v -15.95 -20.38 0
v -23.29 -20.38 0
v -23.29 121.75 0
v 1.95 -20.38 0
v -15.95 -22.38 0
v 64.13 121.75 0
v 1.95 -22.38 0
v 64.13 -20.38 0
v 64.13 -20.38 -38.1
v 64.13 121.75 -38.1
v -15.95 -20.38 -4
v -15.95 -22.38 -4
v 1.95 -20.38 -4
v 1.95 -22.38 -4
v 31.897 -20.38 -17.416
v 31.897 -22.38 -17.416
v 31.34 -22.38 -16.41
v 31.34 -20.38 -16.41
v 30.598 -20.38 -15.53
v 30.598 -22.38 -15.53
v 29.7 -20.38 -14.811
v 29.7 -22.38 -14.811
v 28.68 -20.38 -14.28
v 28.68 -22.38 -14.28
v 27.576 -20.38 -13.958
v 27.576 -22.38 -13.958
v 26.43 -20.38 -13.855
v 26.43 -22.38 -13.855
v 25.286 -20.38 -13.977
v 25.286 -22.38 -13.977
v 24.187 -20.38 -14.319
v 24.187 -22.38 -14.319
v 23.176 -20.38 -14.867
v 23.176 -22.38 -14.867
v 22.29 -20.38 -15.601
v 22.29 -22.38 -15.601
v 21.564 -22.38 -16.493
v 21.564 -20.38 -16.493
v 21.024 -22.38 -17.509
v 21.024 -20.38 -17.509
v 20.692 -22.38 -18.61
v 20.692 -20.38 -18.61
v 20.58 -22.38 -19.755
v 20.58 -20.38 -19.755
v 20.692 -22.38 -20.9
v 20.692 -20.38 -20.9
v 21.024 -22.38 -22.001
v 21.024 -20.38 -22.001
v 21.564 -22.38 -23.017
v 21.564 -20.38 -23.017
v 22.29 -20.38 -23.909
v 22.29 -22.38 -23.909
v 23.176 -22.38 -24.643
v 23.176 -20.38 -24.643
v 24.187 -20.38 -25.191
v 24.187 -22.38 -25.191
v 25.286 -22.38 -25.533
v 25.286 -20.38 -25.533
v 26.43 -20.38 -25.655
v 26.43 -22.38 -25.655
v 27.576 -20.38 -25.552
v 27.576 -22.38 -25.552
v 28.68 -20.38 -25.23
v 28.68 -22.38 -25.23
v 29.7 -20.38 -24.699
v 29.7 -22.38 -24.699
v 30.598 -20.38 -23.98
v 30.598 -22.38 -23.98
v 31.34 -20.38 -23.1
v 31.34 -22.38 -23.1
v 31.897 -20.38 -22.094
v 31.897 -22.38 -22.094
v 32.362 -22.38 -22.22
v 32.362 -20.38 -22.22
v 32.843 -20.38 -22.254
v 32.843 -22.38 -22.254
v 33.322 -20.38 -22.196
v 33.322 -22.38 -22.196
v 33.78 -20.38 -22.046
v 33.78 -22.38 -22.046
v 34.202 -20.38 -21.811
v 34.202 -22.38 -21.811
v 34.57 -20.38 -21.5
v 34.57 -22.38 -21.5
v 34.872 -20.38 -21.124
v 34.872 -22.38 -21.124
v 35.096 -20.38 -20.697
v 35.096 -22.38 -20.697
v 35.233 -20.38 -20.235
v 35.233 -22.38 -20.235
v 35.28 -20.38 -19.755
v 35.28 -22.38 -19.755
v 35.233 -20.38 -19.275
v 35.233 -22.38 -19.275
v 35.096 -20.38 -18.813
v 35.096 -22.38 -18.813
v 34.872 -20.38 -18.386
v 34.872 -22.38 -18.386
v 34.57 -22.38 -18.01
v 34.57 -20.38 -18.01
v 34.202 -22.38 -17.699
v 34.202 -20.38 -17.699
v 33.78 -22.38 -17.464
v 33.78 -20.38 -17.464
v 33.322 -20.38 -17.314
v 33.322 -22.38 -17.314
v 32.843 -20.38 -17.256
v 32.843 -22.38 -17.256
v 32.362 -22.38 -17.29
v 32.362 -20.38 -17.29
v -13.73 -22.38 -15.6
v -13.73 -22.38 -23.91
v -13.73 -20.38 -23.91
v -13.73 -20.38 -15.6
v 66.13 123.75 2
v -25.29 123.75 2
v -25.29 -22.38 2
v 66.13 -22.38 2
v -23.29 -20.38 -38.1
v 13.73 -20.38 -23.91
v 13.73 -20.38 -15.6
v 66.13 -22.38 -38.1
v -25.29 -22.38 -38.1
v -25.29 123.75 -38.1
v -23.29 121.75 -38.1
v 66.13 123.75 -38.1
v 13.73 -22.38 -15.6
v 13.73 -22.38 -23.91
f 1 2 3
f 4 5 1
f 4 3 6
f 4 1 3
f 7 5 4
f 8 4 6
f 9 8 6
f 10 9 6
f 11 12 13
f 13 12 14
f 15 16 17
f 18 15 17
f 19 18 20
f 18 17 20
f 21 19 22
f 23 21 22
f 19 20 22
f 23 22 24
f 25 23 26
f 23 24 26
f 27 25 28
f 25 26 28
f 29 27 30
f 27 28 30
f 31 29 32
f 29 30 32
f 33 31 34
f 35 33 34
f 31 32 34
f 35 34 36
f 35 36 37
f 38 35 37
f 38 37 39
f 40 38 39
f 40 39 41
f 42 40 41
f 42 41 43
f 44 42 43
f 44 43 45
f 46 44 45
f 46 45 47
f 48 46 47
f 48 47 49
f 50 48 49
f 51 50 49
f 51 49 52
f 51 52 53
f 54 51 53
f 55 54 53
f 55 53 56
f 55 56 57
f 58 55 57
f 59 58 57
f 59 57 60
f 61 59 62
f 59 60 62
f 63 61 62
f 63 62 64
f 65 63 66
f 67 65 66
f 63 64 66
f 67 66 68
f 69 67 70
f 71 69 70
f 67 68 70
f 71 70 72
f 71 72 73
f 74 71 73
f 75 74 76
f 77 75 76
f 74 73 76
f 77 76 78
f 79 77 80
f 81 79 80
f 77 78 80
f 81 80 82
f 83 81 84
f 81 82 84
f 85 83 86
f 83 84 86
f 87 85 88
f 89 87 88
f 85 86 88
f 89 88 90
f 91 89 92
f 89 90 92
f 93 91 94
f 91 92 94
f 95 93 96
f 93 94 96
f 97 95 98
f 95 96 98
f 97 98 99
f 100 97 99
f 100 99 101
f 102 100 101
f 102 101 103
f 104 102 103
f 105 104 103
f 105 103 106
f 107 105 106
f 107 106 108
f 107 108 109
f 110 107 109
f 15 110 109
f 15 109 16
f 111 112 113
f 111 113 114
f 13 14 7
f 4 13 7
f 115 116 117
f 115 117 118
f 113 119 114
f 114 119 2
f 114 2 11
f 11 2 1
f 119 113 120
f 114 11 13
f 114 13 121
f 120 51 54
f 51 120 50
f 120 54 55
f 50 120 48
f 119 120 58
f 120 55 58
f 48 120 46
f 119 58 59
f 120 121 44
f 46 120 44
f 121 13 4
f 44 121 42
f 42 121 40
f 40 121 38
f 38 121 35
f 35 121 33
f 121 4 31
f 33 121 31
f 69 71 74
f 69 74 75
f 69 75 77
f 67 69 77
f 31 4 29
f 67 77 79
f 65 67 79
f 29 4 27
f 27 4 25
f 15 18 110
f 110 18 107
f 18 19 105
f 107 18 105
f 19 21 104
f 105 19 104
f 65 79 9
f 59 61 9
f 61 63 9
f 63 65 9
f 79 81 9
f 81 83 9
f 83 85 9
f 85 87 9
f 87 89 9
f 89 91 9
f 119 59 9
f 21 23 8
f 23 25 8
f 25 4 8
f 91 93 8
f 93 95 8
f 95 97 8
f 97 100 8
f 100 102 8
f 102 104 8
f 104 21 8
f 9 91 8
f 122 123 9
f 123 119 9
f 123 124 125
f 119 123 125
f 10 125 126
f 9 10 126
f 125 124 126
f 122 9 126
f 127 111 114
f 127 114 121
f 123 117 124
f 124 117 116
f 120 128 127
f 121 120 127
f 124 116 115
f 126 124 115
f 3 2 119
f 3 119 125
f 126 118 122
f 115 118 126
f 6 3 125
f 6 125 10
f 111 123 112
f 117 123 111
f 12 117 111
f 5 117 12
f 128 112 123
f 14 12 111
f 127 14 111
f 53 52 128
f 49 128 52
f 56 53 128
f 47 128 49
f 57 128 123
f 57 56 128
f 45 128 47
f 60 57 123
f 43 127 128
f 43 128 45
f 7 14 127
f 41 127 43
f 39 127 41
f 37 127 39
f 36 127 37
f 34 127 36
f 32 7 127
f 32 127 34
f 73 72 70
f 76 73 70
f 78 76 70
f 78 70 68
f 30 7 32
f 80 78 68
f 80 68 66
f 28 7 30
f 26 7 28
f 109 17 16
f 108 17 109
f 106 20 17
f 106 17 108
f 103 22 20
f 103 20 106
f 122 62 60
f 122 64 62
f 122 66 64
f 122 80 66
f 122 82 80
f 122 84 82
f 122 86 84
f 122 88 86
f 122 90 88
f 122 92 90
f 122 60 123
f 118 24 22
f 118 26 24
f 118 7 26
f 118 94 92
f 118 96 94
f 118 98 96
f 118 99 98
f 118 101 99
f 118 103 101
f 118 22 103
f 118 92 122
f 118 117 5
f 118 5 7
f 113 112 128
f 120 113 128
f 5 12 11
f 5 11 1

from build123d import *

# Parameters (mm, degrees)
SKETCH_1_W          = 87.41993269
SKETCH_1_H          = 142.13
EXTRUDE_1_DEPTH     = 2
SKETCH_3_W          = 91.41993269
SKETCH_3_H          = 146.13
SKETCH_3_W_2        = 87.41993269
SKETCH_3_H_2        = 142.13
EXTRUDE_2_DEPTH     = 40.1
CUT_EXTRUDE_1_REACH = 166.86
SKETCH_4_W          = 27.46
SKETCH_4_H          = 8.31
SKETCH_4_W_2        = 17.9
SKETCH_4_H_2        = 4


with BuildPart() as part:
    # 草图1 → 凸台-拉伸1 (new body)
    with BuildSketch(Plane.XY):
        with Locations((20.419966345, 50.685)):
            Rectangle(SKETCH_1_W, SKETCH_1_H)
    extrude(amount=EXTRUDE_1_DEPTH)

    # 草图3 → 凸台-拉伸2 (add)
    with BuildSketch(Plane.XY.offset(2)):
        with Locations((20.419966345, 50.685)):
            Rectangle(SKETCH_3_W, SKETCH_3_H)
        with Locations((20.419966345, 50.685)):
            Rectangle(SKETCH_3_W_2, SKETCH_3_H_2, mode=Mode.SUBTRACT)
    extrude(amount=-EXTRUDE_2_DEPTH)

    # 草图4 → 切除-拉伸1 (cut, up to next)
    with BuildSketch(Plane.XZ.offset(22.38), mode=Mode.PRIVATE) as cut_extrude_1_sk1:
        with Locations((0, -19.755)):
            Rectangle(SKETCH_4_W, SKETCH_4_H)
    cut_extrude_1_tool1 = extrude(cut_extrude_1_sk1.sketch, amount=-CUT_EXTRUDE_1_REACH, mode=Mode.PRIVATE) & part.part
    # 草图4 → 切除-拉伸1 (cut, up to next)
    with BuildSketch(Plane.XZ.offset(22.38), mode=Mode.PRIVATE) as cut_extrude_1_sk2:
        with Locations((-7, -2)):
            Rectangle(SKETCH_4_W_2, SKETCH_4_H_2)
    cut_extrude_1_tool2 = extrude(cut_extrude_1_sk2.sketch, amount=-CUT_EXTRUDE_1_REACH, mode=Mode.PRIVATE) & part.part
    # 草图4 → 切除-拉伸1 (cut, up to next)
    with BuildSketch(Plane.XZ.offset(22.38), mode=Mode.PRIVATE) as cut_extrude_1_sk3:
        with BuildLine():
            ThreePointArc((31.896666667, -17.416256273), (20.58, -19.755), (31.896666667, -22.093743727))
            ThreePointArc((31.896666667, -22.093743727), (35.28, -19.755), (31.896666667, -17.416256273))
        make_face()
    cut_extrude_1_tool3 = extrude(cut_extrude_1_sk3.sketch, amount=-CUT_EXTRUDE_1_REACH, mode=Mode.PRIVATE) & part.part
    add(cut_extrude_1_tool1.solids().sort_by_distance((0, -22.38, -19.755))[0], mode=Mode.SUBTRACT)
    add(cut_extrude_1_tool2.solids().sort_by_distance((-7, -22.38, -2))[0], mode=Mode.SUBTRACT)
    add(cut_extrude_1_tool3.solids().sort_by_distance((27.210327, -22.38, -19.755))[0], mode=Mode.SUBTRACT)


solid = part.part
